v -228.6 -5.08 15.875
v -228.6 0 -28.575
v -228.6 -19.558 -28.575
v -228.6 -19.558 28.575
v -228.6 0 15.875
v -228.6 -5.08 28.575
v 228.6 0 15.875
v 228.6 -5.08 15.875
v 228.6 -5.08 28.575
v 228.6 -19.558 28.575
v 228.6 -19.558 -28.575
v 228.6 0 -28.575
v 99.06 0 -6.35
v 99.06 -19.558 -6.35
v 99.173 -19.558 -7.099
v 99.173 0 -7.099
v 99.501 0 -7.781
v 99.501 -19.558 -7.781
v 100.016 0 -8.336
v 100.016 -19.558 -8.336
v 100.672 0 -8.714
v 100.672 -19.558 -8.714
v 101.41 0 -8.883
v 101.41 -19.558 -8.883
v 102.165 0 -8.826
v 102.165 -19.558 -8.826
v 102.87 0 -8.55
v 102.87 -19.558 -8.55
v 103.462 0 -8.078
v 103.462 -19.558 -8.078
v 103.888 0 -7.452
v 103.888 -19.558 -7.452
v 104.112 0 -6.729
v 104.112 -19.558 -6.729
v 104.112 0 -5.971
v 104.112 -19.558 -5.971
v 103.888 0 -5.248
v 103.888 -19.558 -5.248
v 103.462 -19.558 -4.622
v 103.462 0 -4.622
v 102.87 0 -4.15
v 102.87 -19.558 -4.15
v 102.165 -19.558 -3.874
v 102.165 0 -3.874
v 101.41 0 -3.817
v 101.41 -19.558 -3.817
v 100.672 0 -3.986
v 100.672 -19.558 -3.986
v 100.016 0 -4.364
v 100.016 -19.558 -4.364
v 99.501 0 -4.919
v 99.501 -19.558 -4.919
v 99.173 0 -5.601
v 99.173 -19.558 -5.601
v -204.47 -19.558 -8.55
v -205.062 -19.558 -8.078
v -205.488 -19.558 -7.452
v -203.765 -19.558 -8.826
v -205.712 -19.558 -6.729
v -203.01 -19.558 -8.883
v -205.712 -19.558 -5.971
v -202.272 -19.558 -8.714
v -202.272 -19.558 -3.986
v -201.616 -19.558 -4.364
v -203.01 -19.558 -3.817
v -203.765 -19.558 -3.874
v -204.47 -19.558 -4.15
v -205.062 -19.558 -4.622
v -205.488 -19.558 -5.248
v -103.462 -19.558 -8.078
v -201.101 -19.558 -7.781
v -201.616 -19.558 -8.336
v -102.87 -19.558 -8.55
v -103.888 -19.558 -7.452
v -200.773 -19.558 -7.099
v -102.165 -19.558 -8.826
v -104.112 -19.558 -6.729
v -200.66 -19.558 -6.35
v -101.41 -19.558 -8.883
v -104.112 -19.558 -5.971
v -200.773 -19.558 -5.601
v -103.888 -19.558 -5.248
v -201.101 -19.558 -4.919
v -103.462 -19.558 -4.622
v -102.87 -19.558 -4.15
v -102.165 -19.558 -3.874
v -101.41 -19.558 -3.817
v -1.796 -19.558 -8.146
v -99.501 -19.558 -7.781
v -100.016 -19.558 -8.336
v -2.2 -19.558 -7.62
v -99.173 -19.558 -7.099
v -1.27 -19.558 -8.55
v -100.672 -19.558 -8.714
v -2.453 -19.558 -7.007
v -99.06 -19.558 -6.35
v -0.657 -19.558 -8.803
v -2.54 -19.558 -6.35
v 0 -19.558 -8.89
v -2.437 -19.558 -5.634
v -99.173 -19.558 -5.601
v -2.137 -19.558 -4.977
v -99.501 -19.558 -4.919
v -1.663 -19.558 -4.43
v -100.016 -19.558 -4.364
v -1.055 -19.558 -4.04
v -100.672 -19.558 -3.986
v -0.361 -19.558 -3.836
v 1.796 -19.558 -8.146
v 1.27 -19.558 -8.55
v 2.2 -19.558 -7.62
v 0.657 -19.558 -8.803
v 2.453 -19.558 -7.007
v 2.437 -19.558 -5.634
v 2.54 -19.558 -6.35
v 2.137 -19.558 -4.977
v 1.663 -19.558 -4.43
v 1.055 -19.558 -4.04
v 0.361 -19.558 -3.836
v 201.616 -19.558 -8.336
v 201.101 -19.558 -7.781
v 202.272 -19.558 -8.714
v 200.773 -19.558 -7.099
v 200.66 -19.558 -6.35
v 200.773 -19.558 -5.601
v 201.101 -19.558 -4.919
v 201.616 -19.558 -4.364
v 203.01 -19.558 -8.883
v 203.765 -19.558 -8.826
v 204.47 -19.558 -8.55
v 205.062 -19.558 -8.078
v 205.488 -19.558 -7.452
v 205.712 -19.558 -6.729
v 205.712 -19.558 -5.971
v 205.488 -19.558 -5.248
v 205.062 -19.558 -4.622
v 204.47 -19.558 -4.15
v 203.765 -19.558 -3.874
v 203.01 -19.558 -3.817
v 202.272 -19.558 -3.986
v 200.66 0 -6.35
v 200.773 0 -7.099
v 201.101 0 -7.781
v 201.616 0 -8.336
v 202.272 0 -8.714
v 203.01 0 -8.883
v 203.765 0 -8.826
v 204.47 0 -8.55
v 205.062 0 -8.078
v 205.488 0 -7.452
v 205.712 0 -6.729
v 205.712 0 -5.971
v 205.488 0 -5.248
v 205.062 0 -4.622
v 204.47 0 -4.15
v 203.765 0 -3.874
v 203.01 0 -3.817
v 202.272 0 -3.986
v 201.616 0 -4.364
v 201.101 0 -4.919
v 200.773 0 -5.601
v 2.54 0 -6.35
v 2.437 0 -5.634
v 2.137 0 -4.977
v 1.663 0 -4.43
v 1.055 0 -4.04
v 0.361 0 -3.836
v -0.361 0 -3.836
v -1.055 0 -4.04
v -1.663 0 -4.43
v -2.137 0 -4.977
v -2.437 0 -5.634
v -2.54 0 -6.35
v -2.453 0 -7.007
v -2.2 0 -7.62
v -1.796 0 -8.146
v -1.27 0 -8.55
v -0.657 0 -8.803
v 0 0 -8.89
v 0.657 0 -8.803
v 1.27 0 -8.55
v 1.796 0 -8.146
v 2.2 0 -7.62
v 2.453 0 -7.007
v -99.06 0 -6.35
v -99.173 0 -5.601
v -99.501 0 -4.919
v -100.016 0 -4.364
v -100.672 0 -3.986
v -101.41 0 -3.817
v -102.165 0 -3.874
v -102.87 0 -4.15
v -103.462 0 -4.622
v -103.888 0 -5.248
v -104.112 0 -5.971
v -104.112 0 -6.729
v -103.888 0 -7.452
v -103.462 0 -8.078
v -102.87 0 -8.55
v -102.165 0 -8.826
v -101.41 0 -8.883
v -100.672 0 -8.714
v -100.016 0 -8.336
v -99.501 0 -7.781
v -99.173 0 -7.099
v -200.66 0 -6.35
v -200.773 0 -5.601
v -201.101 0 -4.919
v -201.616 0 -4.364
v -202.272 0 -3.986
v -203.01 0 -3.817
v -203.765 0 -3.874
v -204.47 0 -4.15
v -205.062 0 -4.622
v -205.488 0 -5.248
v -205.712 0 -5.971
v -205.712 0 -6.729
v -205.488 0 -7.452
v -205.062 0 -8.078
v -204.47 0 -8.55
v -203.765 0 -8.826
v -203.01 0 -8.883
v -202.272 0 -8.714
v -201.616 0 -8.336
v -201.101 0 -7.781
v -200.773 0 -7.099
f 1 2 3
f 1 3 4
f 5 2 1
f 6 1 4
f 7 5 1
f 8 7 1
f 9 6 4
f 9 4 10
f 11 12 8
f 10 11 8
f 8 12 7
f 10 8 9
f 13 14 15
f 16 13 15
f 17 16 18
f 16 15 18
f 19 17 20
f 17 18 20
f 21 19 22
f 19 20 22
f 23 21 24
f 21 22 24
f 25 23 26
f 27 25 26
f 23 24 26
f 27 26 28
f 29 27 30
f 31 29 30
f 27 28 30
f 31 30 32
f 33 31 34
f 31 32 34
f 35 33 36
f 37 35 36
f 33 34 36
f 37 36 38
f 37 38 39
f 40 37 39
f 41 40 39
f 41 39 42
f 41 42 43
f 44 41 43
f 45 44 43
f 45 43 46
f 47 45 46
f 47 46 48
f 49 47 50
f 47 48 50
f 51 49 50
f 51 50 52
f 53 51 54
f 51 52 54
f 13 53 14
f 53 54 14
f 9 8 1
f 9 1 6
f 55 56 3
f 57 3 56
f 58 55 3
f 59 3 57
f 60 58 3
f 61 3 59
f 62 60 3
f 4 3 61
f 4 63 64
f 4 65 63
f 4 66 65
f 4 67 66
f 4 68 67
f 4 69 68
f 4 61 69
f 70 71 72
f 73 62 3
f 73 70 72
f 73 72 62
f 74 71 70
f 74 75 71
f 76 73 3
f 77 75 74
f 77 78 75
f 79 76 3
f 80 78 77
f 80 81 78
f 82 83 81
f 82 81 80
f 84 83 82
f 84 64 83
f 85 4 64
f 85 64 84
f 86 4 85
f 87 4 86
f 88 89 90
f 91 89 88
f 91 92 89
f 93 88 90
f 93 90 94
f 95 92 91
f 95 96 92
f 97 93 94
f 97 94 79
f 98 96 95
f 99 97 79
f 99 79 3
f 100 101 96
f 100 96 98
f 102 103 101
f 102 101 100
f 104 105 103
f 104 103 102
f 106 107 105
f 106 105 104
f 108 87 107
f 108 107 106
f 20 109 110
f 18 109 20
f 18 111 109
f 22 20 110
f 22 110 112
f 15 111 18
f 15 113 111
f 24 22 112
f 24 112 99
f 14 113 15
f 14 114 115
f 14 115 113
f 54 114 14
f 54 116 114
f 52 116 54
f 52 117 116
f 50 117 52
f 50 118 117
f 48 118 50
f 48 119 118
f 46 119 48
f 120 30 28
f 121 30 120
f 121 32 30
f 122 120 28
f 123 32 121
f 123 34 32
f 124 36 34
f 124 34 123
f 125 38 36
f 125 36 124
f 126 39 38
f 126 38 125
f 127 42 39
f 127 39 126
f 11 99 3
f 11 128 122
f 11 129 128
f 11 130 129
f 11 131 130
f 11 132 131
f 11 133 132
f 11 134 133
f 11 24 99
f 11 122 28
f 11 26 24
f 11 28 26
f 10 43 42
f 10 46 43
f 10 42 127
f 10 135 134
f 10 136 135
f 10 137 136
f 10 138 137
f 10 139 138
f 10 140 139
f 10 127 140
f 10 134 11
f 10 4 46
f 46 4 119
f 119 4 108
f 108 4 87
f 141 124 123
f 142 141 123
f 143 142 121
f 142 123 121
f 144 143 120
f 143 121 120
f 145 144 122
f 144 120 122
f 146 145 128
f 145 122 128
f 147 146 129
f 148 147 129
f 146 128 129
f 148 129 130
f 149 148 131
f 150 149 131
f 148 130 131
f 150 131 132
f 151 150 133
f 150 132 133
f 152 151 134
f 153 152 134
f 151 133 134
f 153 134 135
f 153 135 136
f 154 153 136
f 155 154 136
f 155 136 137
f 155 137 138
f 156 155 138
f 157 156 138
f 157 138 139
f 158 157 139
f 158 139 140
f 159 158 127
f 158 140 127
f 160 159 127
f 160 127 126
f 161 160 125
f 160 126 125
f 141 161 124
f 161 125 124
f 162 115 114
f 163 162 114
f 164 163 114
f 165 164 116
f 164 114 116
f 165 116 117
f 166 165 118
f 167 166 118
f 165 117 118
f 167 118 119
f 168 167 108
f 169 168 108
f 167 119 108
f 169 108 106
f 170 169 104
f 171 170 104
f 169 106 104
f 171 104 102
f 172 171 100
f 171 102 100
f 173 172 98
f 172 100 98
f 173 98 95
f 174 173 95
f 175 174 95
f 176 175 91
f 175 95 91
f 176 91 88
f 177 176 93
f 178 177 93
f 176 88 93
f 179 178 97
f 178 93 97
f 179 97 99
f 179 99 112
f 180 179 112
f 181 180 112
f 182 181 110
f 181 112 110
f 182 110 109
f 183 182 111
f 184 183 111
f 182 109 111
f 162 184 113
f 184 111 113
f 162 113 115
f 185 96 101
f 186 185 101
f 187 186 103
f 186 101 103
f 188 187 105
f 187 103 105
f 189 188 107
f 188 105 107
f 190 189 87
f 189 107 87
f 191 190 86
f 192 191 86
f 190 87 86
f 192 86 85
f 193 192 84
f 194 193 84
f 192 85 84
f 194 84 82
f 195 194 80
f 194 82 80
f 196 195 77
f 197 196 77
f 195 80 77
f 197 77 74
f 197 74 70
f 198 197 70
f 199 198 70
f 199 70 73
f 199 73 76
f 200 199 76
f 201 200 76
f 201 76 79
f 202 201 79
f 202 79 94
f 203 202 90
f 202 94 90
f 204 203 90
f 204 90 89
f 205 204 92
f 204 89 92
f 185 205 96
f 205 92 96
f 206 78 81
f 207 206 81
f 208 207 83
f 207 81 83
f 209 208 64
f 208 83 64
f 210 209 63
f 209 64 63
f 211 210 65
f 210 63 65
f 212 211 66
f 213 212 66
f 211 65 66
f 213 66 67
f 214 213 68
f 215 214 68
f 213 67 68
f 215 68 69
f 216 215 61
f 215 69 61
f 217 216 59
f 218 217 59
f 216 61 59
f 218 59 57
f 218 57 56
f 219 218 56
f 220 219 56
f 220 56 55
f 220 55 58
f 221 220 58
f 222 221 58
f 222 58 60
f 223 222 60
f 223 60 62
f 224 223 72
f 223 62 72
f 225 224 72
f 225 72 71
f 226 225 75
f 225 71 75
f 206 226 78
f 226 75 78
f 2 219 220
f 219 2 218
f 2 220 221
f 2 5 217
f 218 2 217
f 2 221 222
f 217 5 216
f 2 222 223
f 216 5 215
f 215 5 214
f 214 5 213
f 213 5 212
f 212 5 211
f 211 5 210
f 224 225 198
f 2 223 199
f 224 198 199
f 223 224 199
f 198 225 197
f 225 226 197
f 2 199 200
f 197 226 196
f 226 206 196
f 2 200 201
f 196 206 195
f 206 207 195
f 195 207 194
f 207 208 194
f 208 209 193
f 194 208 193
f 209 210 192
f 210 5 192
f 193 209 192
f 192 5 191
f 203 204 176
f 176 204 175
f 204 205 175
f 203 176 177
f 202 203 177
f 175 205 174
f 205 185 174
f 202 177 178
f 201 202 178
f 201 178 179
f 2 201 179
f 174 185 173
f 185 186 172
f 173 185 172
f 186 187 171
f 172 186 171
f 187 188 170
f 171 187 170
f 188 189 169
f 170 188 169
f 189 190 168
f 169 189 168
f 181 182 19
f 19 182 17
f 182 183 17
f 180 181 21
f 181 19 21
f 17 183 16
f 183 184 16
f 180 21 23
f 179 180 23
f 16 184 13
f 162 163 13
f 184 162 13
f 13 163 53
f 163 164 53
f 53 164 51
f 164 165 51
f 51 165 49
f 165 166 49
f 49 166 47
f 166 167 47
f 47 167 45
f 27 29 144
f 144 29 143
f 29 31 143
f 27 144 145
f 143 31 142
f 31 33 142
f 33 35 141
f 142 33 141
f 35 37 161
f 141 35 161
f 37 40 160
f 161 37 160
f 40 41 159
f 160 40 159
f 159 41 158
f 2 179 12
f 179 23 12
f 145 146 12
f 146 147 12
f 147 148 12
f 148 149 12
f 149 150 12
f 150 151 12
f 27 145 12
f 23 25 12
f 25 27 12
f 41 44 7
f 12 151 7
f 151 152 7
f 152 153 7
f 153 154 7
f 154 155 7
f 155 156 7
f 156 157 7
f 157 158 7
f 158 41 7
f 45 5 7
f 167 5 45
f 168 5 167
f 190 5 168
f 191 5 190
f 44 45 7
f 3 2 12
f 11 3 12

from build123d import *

# Parameters (mm, degrees)
F0_W     = 457.2
F0_H     = 57.15
F1_DEPTH = 19.558
F2_W     = 5.08
F2_H     = 12.7
F3_DEPTH = 457.2
F4_R     = 2.54
F5_DEPTH = 19.558


with BuildPart() as f1:
    # F0 (on Front) → F1 (new body)
    with BuildSketch(Plane.XZ):
        Rectangle(F0_W, F0_H)
    extrude(amount=F1_DEPTH)

    # F2 (on face) → F3 (cut, through all)
    with BuildSketch(Plane(origin=(-228.6, 0, 0), x_dir=(0, -1, 0), z_dir=(-1, 0, 0))):
        with Locations((2.54, 22.225)):
            Rectangle(F2_W, F2_H)
    extrude(amount=-F3_DEPTH, mode=Mode.SUBTRACT)

    # F4 (on face) → F5 (cut, through all)
    with BuildSketch(Plane.XZ.offset(19.558)):
        with BuildLine():
            ThreePointArc((-2.54, -6.35), (-1.796051, -8.146051), (0, -8.89))
            Line((0, -8.89), (0, -6.35))
            Line((0, -6.35), (-2.54, -6.35))
        make_face()
        with Locations((-203.2, -6.35)):
            Circle(F4_R)
        with BuildLine():
            ThreePointArc((-104.14, -6.35), (-101.6, -8.89), (-99.06, -6.35))
            Line((-99.06, -6.35), (-101.6, -6.35))
            Line((-101.6, -6.35), (-104.14, -6.35))
        make_face()
        with BuildLine():
            Line((-101.6, -6.35), (-99.06, -6.35))
            ThreePointArc((-99.06, -6.35), (-101.6, -3.81), (-104.14, -6.35))
            Line((-104.14, -6.35), (-101.6, -6.35))
        make_face()
        with BuildLine():
            ThreePointArc((205.74, -6.35), (203.2, -3.81), (200.66, -6.35))
            ThreePointArc((200.66, -6.35), (203.2, -8.89), (205.74, -6.35))
        make_face()
        with BuildLine():
            ThreePointArc((104.14, -6.35), (101.6, -3.81), (99.06, -6.35))
            Line((99.06, -6.35), (101.6, -6.35))
            Line((101.6, -6.35), (104.14, -6.35))
        make_face()
        with BuildLine():
            Line((101.6, -6.35), (99.06, -6.35))
            ThreePointArc((99.06, -6.35), (101.6, -8.89), (104.14, -6.35))
            Line((104.14, -6.35), (101.6, -6.35))
        make_face()
        with BuildLine():
            Line((0, -6.35), (0, -8.89))
            ThreePointArc((0, -8.89), (1.796051, -8.146051), (2.54, -6.35))
            Line((2.54, -6.35), (0, -6.35))
        make_face()
        with BuildLine():
            Line((-2.54, -6.35), (0, -6.35))
            Line((0, -6.35), (2.54, -6.35))
            ThreePointArc((2.54, -6.35), (0, -3.81), (-2.54, -6.35))
        make_face()
    extrude(amount=-F5_DEPTH, mode=Mode.SUBTRACT)


solid = f1.part
